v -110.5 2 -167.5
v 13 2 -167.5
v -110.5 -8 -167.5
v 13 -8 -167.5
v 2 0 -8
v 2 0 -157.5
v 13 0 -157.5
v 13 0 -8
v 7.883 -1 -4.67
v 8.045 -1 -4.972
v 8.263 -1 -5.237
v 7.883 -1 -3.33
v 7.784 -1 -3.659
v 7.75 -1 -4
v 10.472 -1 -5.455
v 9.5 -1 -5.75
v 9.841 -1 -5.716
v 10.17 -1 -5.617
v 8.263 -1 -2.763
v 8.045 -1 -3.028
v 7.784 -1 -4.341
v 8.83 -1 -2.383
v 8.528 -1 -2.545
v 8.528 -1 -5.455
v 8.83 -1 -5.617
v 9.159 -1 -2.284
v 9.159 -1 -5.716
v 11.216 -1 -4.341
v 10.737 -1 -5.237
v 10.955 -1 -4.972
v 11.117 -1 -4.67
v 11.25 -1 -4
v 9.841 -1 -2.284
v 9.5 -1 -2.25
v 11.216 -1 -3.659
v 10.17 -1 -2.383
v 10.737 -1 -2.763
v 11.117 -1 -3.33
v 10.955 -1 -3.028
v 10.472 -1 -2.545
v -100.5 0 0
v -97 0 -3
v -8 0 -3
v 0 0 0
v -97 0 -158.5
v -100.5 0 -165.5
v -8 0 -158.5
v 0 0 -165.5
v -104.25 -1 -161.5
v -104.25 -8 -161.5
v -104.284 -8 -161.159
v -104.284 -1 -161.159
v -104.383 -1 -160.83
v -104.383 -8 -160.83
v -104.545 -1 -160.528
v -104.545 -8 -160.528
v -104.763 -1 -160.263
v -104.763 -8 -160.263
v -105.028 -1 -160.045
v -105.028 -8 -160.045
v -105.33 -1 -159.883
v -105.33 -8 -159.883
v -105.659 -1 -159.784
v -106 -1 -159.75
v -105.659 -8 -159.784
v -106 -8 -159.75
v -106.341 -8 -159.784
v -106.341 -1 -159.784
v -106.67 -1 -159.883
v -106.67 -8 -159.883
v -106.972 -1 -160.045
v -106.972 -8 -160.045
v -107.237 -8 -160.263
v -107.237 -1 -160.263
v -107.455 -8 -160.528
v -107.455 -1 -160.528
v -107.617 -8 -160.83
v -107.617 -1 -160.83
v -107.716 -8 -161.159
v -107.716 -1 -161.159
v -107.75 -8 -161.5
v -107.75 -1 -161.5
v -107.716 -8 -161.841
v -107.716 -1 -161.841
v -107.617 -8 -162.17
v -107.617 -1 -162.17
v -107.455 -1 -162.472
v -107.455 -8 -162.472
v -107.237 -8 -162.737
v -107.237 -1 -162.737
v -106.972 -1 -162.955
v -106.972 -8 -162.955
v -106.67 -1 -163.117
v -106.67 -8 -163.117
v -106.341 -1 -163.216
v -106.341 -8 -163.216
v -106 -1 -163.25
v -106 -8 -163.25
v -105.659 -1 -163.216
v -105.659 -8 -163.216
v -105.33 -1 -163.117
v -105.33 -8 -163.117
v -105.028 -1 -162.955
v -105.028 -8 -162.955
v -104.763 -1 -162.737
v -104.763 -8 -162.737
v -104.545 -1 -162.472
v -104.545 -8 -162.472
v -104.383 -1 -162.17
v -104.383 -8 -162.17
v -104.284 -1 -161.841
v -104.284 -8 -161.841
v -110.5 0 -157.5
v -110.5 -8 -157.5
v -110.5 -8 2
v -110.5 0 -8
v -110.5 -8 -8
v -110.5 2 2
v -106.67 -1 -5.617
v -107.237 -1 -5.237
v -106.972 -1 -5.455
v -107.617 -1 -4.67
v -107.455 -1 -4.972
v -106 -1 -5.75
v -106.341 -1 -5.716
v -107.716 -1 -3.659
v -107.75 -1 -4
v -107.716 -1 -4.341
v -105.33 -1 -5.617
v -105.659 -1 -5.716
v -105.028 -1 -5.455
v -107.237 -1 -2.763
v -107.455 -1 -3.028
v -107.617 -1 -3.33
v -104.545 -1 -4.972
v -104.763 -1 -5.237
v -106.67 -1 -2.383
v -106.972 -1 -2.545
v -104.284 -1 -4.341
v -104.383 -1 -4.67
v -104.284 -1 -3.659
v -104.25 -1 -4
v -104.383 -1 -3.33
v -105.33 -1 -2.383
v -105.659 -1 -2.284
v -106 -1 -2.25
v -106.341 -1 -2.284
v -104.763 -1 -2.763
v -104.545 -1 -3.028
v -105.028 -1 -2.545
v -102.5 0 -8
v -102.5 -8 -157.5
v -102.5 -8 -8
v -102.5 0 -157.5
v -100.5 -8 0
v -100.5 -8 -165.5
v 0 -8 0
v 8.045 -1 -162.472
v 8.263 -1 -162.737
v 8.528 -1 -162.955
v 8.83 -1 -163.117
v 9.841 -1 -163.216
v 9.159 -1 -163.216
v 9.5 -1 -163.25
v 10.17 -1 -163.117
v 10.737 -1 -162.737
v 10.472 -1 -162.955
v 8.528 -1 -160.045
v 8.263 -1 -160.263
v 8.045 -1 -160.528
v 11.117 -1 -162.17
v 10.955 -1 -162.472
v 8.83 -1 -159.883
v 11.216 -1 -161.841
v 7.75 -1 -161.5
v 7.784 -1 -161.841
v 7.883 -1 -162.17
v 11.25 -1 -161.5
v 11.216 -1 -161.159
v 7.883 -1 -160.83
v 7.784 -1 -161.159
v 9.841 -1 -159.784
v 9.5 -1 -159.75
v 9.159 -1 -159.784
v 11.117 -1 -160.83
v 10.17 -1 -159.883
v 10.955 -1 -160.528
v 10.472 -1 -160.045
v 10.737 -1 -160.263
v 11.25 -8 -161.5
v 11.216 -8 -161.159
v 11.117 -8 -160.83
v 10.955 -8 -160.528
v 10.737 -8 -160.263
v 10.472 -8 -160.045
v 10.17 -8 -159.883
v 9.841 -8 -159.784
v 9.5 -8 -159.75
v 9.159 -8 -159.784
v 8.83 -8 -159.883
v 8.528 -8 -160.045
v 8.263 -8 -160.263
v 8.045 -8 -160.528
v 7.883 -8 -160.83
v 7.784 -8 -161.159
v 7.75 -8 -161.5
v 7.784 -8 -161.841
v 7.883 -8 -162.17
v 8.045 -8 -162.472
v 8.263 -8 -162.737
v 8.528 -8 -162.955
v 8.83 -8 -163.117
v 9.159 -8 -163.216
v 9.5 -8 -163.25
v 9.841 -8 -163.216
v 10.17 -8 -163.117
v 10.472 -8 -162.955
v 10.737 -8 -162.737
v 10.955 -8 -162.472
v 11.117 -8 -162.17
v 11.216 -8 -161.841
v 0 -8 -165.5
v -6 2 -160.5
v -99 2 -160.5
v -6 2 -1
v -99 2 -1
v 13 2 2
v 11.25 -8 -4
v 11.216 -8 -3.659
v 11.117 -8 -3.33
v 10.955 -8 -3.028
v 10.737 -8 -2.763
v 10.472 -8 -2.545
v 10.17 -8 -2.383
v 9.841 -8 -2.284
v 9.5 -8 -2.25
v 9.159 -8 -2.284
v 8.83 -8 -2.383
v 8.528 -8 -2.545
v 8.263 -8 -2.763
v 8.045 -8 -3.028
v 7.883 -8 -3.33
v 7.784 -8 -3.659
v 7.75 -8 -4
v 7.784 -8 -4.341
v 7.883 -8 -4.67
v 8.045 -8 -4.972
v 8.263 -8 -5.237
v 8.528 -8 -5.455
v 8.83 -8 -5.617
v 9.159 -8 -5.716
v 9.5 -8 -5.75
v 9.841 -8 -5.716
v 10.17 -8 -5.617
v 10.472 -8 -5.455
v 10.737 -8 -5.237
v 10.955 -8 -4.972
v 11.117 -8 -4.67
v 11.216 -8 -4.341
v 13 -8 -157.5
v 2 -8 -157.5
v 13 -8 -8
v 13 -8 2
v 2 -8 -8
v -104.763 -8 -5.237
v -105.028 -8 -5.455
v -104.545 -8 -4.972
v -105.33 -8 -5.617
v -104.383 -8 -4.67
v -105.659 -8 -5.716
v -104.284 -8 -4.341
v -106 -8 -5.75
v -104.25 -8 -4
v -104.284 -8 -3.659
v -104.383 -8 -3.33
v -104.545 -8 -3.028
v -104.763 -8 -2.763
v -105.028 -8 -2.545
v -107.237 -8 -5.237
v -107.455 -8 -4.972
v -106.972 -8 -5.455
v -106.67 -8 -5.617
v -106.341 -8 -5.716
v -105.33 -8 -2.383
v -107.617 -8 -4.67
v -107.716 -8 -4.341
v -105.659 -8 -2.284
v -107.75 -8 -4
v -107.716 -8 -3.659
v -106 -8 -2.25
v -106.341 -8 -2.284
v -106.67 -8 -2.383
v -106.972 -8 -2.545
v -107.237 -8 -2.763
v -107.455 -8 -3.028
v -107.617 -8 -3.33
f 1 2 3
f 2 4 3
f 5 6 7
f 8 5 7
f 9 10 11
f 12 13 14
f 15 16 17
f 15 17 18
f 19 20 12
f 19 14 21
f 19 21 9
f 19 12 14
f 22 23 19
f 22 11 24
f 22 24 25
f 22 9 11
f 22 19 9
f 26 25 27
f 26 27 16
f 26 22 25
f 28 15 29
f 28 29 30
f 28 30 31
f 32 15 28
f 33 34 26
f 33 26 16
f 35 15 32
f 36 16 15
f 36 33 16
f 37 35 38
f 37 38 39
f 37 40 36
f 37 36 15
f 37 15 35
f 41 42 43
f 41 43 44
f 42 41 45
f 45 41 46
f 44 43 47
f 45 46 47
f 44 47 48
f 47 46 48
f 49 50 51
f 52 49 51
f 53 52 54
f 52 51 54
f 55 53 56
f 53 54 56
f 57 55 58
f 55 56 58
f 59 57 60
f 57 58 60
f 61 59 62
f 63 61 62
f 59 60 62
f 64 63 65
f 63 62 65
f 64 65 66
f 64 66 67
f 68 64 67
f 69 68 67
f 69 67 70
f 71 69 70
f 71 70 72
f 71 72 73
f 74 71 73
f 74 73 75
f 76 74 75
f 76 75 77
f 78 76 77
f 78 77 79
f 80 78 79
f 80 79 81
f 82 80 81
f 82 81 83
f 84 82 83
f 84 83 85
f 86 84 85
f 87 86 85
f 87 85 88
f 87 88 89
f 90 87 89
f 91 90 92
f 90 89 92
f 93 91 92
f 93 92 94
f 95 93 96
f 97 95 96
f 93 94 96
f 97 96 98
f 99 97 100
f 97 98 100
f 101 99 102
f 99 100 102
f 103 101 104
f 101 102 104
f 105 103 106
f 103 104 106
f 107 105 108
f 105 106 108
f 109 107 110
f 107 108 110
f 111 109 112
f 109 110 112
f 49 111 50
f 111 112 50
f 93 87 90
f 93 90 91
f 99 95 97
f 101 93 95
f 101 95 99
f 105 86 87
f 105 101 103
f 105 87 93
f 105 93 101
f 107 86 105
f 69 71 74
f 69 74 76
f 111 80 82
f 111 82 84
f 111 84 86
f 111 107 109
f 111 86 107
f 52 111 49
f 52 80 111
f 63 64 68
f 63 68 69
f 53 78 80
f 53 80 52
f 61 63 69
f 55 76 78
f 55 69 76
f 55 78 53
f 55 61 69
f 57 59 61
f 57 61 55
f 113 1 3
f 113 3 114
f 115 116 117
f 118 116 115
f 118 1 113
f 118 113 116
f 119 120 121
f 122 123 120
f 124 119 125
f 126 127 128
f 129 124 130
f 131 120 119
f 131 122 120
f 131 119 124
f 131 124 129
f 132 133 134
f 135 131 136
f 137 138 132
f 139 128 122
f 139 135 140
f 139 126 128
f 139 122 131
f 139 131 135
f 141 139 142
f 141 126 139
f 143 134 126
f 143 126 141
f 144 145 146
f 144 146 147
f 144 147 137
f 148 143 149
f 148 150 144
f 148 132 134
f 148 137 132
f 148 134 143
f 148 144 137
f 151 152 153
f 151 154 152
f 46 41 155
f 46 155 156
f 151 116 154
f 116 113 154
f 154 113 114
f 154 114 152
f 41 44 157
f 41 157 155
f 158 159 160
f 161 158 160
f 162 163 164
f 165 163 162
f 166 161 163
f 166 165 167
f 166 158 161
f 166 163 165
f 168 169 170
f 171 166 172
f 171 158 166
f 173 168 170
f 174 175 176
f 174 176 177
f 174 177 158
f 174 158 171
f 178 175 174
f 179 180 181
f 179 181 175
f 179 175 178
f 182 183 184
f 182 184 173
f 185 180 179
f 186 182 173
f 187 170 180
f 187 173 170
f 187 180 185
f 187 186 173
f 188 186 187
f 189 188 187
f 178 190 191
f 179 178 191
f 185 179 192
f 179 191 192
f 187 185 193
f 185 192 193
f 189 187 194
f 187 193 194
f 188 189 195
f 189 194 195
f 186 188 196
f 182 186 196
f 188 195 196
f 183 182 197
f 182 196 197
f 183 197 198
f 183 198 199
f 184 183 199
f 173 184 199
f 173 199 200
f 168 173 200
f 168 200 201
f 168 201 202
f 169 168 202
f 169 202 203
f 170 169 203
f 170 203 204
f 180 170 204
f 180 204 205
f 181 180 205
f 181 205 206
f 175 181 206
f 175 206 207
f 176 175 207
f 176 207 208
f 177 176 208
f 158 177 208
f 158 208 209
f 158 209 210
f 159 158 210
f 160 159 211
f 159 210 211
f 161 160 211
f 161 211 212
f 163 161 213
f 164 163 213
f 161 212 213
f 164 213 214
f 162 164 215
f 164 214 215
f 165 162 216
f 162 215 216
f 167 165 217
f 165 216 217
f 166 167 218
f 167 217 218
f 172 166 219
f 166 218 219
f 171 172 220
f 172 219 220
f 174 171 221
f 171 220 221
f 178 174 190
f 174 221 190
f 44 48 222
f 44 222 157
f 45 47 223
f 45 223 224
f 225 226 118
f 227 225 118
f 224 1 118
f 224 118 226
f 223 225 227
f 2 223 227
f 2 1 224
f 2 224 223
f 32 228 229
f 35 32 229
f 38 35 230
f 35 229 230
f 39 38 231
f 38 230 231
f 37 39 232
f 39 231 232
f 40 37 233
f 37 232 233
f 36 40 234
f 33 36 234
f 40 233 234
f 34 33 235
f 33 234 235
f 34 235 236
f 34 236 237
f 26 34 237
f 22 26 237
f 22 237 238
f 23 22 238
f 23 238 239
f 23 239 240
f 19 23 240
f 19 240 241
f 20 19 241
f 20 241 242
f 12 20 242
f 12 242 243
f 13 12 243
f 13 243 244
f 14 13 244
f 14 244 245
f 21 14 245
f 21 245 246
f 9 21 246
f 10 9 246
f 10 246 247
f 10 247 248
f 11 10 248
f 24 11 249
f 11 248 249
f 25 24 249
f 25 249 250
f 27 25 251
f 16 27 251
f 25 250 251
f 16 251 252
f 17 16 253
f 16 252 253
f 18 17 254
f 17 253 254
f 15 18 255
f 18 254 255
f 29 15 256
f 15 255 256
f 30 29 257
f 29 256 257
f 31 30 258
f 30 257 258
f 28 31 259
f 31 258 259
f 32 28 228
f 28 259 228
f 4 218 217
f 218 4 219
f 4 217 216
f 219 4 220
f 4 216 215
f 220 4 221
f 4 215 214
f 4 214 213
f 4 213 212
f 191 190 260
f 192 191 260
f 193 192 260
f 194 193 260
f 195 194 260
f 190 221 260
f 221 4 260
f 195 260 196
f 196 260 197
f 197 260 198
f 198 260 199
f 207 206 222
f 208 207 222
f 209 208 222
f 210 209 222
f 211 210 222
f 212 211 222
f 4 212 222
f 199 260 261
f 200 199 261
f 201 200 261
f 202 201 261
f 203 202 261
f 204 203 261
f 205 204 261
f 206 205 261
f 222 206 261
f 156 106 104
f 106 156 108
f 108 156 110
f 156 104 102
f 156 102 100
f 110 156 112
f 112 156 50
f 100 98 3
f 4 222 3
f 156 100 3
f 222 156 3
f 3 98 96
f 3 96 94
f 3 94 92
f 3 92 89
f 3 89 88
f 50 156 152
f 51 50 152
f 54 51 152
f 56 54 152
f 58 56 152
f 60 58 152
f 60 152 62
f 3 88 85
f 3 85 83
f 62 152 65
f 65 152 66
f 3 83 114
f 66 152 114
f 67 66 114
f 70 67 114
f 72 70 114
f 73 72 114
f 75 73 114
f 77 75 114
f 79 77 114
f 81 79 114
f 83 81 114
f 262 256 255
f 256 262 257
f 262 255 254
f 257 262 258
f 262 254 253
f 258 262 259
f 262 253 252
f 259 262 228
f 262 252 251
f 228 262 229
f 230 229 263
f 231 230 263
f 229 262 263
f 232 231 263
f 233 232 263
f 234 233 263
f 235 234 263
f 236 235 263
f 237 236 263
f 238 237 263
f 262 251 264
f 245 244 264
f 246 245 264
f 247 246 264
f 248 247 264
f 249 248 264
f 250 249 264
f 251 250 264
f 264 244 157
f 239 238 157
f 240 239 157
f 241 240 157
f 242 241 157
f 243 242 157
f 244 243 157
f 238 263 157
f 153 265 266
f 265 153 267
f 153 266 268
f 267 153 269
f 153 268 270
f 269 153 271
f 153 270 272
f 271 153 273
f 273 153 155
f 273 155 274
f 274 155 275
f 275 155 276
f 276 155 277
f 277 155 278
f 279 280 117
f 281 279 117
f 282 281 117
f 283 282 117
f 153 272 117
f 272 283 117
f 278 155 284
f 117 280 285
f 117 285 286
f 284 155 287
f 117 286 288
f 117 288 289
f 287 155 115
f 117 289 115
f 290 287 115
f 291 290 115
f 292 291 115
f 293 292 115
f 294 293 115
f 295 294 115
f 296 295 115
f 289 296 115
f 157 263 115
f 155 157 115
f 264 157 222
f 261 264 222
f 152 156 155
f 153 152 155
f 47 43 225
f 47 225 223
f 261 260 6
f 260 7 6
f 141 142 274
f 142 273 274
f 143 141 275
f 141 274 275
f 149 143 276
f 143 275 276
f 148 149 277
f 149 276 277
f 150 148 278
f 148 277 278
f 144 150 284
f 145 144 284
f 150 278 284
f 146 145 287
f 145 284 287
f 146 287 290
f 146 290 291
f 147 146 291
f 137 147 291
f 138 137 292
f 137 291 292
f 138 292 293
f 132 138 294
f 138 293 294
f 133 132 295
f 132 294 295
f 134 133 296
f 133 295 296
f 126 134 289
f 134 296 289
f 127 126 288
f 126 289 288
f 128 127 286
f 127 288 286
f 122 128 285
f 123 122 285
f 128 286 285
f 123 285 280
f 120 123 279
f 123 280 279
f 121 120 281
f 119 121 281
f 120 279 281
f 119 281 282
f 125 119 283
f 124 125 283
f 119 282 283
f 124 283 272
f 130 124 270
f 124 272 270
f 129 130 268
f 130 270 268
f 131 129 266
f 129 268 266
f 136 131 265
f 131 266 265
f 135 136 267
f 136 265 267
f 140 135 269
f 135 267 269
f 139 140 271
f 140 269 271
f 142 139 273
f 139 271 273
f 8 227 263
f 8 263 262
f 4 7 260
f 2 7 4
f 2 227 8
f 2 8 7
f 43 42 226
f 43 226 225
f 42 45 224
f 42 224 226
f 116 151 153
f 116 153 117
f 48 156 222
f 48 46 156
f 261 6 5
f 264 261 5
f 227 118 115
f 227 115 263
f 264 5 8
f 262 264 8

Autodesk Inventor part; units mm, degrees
ref_plane "YZ Plane" through (0, 0, 0) normal (1, 0, 0) x (0, 1, 0)
ref_plane "XZ Plane" through (0, 0, 0) normal (0, 1, 0) x (-1, 0, 0)
ref_plane "XY Plane" through (0, 0, 0) normal (0, 0, 1) x (1, 0, 0)
sketch "Sketch1" plane through (0, 0, 0) normal (0, 1, 0) x (-1, 0, 0)
  line L0 (0, 0) -> (100.5, 0)
  line L1 (100.5, 0) -> (100.5, -165.5)
  line L2 (100.5, -165.5) -> (0, -165.5)
  line L3 (0, -165.5) -> (0, 0)
  line L4 (110.5, 2) -> (-13, 2)
  line L5 (-13, 2) -> (-13, -167.5)
  line L6 (-13, -167.5) -> (110.5, -167.5)
  line L7 (110.5, -167.5) -> (110.5, 2)
  line L8 (110.5, -157.5) -> (102.5, -157.5)
  line L9 (102.5, -157.5) -> (102.5, -8)
  line L10 (102.5, -8) -> (110.5, -8)
  line L11 (110.5, -8) -> (110.5, -157.5)
  line L12 (-13, -157.5) -> (-2, -157.5)
  line L13 (-2, -157.5) -> (-2, -8)
  line L14 (-2, -8) -> (-13, -8)
  line L15 (-13, -8) -> (-13, -157.5)
  point P0 (110.5, -8)
  point P1 (-13, -8)
  dimension "d0" = 100.5
  dimension "d1" = 165.5
  dimension "d2" = 2
  dimension "d3" = 13
  dimension "d4" = 10
  dimension "d5" = 2
  dimension "d33" = 8
  dimension "d34" = 8
  dimension "d35" = 8
  dimension "d36" = 8
  dimension "d37" = 2
  dimension "d38" = 2
extrude "Extrusion1" add sketch "Sketch1" against normal blind 8 contours L7 L10 L9 L8 L6 L5 L12 L13 L14 L4
sketch "Sketch2" plane through (0, 0, 0) normal (0, 1, 0) x (1, 0, 0)
  line L0 (-97, 3) -> (-8, 3)
  line L1 (-8, 3) -> (-8, 158.5)
  line L2 (-8, 158.5) -> (-97, 158.5)
  line L3 (-97, 158.5) -> (-97, 3)
  line L4 (-100.5, 0) -> (-100.5, 165.5) projected
  line L5 (-100.5, 165.5) -> (0, 165.5) projected
  line L6 (0, 165.5) -> (0, 0) projected
  line L7 (0, 0) -> (-100.5, 0) projected
  line L8 (13, -2) -> (-110.5, -2) projected
  line L9 (13, 167.5) -> (13, -2) projected
  line L10 (-110.5, -2) -> (13, -2)
  line L11 (13, -2) -> (13, 167.5)
  line L12 (13, 167.5) -> (-110.5, 167.5)
  line L13 (-110.5, 167.5) -> (-110.5, -2)
  dimension "d8" = 3.5
  dimension "d9" = 7
  dimension "d10" = 8
  dimension "d11" = 3
extrude "Extrusion2" add sketch "Sketch2" along normal blind 2 contours L4 L5 L6 L7 | L8 L13 L12 L9
sketch "Sketch3" plane through (0, -8, 0) normal (0, -1, 0) x (1, 0, 0)
  circle A0 centre (-106, -161.5) radius 1.75
  line L0 (-100.5, -165.5) -> (-100.5, 0) projected
  line L1 (0, -165.5) -> (-100.5, -165.5) projected
  circle A1 centre (-106, -4) radius 1.75
  line L2 (-100.5, 0) -> (0, 0) projected
  circle A2 centre (9.5, -4) radius 1.75
  line L3 (0, 0) -> (0, -165.5) projected
  circle A3 centre (9.5, -161.5) radius 1.75
  dimension "d14" = 3.5
  dimension "d15" = 5.5
  dimension "d16" = 4
  dimension "d17" = 3.5
  dimension "d18" = 4
  dimension "d19" = 5.5
  dimension "d20" = 3.5
  dimension "d21" = 4
  dimension "d22" = 9.5
  dimension "d23" = 3.5
  dimension "d24" = 9.5
  dimension "d25" = 4
extrude "Extrusion3" cut sketch "Sketch3" against normal blind 7 contours A0 | A1 | A2 | A3
chamfer "Chamfer1" distance 2 angle 45 4 edges at (-97, 2, -80.75) (-52.5, 2, -3) (-52.5, 2, -158.5) (-8, 2, -80.75)
equation "\"d14\" = hueco_diam"
equation "\"d17\" = hueco_diam"
equation "\"d20\" = hueco_diam"
equation "\"d21\" = hueco_sep_lat"
equation "\"d23\" = hueco_diam"
equation "\"d25\" = hueco_sep_lat"
equation "\"hueco_sep_inf\" = 4.5"
equation "\"hueco_sep_lat\" = 4"
equation "\"tol1\" = 0.5"
equation "\"hueco_diam\" = 3.5"
properties part number "PlantillaPantalla"
